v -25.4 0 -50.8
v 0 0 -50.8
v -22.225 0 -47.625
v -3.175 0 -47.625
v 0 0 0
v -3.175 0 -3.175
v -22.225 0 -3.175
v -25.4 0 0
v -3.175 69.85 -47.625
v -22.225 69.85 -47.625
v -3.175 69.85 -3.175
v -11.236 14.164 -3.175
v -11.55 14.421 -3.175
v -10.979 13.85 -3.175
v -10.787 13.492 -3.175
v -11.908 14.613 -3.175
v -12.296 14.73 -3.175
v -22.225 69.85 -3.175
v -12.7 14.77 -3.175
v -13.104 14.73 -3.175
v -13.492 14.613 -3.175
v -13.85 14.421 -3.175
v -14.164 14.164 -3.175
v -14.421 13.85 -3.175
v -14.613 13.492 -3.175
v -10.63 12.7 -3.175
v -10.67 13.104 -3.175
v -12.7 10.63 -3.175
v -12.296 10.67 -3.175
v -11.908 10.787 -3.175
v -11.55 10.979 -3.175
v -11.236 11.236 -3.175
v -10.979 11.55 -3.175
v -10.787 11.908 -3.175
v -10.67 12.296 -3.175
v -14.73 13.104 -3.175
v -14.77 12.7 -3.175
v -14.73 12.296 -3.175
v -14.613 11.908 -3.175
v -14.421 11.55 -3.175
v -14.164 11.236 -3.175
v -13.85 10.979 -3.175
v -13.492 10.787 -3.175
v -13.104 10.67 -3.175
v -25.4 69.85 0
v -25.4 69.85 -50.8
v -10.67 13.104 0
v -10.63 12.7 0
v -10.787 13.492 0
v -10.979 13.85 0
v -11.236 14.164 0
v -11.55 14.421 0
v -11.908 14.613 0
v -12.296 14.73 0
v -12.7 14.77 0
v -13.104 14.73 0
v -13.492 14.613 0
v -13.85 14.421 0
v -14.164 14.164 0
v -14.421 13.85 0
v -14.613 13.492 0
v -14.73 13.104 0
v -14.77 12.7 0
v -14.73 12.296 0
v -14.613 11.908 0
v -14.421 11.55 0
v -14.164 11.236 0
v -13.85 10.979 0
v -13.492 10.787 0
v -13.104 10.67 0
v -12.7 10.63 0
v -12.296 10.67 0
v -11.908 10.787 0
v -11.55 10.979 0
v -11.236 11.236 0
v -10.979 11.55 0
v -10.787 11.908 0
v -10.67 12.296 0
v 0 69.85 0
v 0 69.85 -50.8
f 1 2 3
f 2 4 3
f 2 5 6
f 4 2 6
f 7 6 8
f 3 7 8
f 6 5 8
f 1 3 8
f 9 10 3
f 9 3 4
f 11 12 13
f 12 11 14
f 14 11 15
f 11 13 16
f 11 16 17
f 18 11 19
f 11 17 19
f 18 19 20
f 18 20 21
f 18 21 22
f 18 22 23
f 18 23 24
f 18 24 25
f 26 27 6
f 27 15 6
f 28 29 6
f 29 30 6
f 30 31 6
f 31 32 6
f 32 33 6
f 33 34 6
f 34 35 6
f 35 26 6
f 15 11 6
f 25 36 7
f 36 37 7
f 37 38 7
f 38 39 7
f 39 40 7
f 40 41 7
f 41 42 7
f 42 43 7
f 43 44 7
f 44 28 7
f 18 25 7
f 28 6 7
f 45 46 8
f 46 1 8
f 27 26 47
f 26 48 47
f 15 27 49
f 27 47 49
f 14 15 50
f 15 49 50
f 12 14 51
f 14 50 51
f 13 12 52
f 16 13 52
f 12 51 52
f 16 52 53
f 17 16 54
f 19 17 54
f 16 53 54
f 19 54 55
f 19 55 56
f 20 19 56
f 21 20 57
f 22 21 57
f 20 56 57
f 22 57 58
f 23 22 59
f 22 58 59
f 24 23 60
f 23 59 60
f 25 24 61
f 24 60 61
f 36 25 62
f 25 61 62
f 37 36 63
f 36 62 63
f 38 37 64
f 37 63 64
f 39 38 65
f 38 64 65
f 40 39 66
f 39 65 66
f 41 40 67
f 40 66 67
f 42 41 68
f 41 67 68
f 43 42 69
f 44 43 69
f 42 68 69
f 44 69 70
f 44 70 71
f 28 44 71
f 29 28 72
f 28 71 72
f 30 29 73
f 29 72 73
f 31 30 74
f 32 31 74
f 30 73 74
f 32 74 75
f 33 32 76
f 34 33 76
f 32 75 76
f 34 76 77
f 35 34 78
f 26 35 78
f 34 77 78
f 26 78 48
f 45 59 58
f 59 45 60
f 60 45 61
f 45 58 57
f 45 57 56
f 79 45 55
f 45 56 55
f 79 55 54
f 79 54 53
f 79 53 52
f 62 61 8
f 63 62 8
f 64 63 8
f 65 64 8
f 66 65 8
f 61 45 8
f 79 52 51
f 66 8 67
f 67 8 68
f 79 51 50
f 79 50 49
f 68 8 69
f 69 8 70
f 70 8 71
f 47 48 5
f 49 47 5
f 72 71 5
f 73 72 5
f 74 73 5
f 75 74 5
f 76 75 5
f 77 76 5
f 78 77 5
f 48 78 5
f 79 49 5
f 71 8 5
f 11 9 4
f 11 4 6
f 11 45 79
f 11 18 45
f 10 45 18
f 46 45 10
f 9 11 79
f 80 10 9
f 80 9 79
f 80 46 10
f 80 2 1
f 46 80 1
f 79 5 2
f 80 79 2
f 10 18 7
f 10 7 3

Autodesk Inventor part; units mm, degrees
ref_plane "YZ Plane" through (0, 0, 0) normal (1, 0, 0) x (0, 1, 0)
ref_plane "XZ Plane" through (0, 0, 0) normal (0, 1, 0) x (-1, 0, 0)
ref_plane "XY Plane" through (0, 0, 0) normal (0, 0, 1) x (1, 0, 0)
sketch "Sketch1" plane through (0, 0, 0) normal (0, 1, 0) x (-1, 0, 0)
  line L0 (0, 0) -> (25.4, 0)
  line L1 (25.4, 0) -> (25.4, -50.8)
  line L2 (25.4, -50.8) -> (0, -50.8)
  line L3 (0, -50.8) -> (0, 0)
  line L4 (3.175, -47.625) -> (22.225, -47.625)
  line L5 (22.225, -47.625) -> (22.225, -3.175)
  line L6 (22.225, -3.175) -> (3.175, -3.175)
  line L7 (3.175, -3.175) -> (3.175, -47.625)
  dimension "d0" = 50.8
  dimension "d1" = 25.4
  dimension "d2" = 3.175
extrude "Extrusion1" add sketch "Sketch1" along normal blind 50.8
sketch "Sketch2" plane through (0, 50.8, 0) normal (0, 1, 0) x (1, 0, 0)
  line L0 (-3.175, 47.625) -> (-3.175, 3.175) projected
  line L1 (-3.175, 3.175) -> (-22.225, 3.175) projected
  line L2 (-22.225, 3.175) -> (-22.225, 47.625) projected
  line L3 (-22.225, 47.625) -> (-3.175, 47.625) projected
  line L4 (-25.4, 0) -> (0, 0) projected
  line L5 (0, 0) -> (0, 50.8) projected
  line L6 (0, 50.8) -> (-25.4, 50.8) projected
  line L7 (-25.4, 50.8) -> (-25.4, 0) projected
extrude "Extrusion2" add sketch "Sketch2" along normal blind 12.7
sketch "Sketch3" plane through (0, 63.5, 0) normal (0, 1, 0) x (1, 0, 0)
  line L0 (-3.175, 3.175) -> (-22.225, 3.175) projected
  line L1 (-22.225, 3.175) -> (-22.225, 47.625) projected
  line L2 (-22.225, 47.625) -> (-3.175, 47.625) projected
  line L3 (-3.175, 47.625) -> (-3.175, 3.175) projected
  line L4 (-25.4, 0) -> (0, 0) projected
  line L5 (0, 0) -> (0, 50.8) projected
  line L6 (0, 50.8) -> (-25.4, 50.8) projected
  line L7 (-25.4, 50.8) -> (-25.4, 0) projected
extrude "Extrusion3" add sketch "Sketch3" along normal blind 6.35
sketch "Sketch4" plane through (-25.4, 0, 0) normal (0, 0, 1) x (1, 0, 0)
  circle A0 centre (12.7, 12.7) radius 2.0701
  line L0 (25.4, 0) -> (0, 0) projected
  line L1 (25.4, 0) -> (25.4, 69.85) projected
  dimension "d9" = 4.1402
  dimension "d10" = 12.7
  dimension "d11" = 12.7
extrude "Extrusion4" cut sketch "Sketch4" against normal blind 25.4
properties part number "2x1 2in Alluminum Block.ver1-1111-2019"
